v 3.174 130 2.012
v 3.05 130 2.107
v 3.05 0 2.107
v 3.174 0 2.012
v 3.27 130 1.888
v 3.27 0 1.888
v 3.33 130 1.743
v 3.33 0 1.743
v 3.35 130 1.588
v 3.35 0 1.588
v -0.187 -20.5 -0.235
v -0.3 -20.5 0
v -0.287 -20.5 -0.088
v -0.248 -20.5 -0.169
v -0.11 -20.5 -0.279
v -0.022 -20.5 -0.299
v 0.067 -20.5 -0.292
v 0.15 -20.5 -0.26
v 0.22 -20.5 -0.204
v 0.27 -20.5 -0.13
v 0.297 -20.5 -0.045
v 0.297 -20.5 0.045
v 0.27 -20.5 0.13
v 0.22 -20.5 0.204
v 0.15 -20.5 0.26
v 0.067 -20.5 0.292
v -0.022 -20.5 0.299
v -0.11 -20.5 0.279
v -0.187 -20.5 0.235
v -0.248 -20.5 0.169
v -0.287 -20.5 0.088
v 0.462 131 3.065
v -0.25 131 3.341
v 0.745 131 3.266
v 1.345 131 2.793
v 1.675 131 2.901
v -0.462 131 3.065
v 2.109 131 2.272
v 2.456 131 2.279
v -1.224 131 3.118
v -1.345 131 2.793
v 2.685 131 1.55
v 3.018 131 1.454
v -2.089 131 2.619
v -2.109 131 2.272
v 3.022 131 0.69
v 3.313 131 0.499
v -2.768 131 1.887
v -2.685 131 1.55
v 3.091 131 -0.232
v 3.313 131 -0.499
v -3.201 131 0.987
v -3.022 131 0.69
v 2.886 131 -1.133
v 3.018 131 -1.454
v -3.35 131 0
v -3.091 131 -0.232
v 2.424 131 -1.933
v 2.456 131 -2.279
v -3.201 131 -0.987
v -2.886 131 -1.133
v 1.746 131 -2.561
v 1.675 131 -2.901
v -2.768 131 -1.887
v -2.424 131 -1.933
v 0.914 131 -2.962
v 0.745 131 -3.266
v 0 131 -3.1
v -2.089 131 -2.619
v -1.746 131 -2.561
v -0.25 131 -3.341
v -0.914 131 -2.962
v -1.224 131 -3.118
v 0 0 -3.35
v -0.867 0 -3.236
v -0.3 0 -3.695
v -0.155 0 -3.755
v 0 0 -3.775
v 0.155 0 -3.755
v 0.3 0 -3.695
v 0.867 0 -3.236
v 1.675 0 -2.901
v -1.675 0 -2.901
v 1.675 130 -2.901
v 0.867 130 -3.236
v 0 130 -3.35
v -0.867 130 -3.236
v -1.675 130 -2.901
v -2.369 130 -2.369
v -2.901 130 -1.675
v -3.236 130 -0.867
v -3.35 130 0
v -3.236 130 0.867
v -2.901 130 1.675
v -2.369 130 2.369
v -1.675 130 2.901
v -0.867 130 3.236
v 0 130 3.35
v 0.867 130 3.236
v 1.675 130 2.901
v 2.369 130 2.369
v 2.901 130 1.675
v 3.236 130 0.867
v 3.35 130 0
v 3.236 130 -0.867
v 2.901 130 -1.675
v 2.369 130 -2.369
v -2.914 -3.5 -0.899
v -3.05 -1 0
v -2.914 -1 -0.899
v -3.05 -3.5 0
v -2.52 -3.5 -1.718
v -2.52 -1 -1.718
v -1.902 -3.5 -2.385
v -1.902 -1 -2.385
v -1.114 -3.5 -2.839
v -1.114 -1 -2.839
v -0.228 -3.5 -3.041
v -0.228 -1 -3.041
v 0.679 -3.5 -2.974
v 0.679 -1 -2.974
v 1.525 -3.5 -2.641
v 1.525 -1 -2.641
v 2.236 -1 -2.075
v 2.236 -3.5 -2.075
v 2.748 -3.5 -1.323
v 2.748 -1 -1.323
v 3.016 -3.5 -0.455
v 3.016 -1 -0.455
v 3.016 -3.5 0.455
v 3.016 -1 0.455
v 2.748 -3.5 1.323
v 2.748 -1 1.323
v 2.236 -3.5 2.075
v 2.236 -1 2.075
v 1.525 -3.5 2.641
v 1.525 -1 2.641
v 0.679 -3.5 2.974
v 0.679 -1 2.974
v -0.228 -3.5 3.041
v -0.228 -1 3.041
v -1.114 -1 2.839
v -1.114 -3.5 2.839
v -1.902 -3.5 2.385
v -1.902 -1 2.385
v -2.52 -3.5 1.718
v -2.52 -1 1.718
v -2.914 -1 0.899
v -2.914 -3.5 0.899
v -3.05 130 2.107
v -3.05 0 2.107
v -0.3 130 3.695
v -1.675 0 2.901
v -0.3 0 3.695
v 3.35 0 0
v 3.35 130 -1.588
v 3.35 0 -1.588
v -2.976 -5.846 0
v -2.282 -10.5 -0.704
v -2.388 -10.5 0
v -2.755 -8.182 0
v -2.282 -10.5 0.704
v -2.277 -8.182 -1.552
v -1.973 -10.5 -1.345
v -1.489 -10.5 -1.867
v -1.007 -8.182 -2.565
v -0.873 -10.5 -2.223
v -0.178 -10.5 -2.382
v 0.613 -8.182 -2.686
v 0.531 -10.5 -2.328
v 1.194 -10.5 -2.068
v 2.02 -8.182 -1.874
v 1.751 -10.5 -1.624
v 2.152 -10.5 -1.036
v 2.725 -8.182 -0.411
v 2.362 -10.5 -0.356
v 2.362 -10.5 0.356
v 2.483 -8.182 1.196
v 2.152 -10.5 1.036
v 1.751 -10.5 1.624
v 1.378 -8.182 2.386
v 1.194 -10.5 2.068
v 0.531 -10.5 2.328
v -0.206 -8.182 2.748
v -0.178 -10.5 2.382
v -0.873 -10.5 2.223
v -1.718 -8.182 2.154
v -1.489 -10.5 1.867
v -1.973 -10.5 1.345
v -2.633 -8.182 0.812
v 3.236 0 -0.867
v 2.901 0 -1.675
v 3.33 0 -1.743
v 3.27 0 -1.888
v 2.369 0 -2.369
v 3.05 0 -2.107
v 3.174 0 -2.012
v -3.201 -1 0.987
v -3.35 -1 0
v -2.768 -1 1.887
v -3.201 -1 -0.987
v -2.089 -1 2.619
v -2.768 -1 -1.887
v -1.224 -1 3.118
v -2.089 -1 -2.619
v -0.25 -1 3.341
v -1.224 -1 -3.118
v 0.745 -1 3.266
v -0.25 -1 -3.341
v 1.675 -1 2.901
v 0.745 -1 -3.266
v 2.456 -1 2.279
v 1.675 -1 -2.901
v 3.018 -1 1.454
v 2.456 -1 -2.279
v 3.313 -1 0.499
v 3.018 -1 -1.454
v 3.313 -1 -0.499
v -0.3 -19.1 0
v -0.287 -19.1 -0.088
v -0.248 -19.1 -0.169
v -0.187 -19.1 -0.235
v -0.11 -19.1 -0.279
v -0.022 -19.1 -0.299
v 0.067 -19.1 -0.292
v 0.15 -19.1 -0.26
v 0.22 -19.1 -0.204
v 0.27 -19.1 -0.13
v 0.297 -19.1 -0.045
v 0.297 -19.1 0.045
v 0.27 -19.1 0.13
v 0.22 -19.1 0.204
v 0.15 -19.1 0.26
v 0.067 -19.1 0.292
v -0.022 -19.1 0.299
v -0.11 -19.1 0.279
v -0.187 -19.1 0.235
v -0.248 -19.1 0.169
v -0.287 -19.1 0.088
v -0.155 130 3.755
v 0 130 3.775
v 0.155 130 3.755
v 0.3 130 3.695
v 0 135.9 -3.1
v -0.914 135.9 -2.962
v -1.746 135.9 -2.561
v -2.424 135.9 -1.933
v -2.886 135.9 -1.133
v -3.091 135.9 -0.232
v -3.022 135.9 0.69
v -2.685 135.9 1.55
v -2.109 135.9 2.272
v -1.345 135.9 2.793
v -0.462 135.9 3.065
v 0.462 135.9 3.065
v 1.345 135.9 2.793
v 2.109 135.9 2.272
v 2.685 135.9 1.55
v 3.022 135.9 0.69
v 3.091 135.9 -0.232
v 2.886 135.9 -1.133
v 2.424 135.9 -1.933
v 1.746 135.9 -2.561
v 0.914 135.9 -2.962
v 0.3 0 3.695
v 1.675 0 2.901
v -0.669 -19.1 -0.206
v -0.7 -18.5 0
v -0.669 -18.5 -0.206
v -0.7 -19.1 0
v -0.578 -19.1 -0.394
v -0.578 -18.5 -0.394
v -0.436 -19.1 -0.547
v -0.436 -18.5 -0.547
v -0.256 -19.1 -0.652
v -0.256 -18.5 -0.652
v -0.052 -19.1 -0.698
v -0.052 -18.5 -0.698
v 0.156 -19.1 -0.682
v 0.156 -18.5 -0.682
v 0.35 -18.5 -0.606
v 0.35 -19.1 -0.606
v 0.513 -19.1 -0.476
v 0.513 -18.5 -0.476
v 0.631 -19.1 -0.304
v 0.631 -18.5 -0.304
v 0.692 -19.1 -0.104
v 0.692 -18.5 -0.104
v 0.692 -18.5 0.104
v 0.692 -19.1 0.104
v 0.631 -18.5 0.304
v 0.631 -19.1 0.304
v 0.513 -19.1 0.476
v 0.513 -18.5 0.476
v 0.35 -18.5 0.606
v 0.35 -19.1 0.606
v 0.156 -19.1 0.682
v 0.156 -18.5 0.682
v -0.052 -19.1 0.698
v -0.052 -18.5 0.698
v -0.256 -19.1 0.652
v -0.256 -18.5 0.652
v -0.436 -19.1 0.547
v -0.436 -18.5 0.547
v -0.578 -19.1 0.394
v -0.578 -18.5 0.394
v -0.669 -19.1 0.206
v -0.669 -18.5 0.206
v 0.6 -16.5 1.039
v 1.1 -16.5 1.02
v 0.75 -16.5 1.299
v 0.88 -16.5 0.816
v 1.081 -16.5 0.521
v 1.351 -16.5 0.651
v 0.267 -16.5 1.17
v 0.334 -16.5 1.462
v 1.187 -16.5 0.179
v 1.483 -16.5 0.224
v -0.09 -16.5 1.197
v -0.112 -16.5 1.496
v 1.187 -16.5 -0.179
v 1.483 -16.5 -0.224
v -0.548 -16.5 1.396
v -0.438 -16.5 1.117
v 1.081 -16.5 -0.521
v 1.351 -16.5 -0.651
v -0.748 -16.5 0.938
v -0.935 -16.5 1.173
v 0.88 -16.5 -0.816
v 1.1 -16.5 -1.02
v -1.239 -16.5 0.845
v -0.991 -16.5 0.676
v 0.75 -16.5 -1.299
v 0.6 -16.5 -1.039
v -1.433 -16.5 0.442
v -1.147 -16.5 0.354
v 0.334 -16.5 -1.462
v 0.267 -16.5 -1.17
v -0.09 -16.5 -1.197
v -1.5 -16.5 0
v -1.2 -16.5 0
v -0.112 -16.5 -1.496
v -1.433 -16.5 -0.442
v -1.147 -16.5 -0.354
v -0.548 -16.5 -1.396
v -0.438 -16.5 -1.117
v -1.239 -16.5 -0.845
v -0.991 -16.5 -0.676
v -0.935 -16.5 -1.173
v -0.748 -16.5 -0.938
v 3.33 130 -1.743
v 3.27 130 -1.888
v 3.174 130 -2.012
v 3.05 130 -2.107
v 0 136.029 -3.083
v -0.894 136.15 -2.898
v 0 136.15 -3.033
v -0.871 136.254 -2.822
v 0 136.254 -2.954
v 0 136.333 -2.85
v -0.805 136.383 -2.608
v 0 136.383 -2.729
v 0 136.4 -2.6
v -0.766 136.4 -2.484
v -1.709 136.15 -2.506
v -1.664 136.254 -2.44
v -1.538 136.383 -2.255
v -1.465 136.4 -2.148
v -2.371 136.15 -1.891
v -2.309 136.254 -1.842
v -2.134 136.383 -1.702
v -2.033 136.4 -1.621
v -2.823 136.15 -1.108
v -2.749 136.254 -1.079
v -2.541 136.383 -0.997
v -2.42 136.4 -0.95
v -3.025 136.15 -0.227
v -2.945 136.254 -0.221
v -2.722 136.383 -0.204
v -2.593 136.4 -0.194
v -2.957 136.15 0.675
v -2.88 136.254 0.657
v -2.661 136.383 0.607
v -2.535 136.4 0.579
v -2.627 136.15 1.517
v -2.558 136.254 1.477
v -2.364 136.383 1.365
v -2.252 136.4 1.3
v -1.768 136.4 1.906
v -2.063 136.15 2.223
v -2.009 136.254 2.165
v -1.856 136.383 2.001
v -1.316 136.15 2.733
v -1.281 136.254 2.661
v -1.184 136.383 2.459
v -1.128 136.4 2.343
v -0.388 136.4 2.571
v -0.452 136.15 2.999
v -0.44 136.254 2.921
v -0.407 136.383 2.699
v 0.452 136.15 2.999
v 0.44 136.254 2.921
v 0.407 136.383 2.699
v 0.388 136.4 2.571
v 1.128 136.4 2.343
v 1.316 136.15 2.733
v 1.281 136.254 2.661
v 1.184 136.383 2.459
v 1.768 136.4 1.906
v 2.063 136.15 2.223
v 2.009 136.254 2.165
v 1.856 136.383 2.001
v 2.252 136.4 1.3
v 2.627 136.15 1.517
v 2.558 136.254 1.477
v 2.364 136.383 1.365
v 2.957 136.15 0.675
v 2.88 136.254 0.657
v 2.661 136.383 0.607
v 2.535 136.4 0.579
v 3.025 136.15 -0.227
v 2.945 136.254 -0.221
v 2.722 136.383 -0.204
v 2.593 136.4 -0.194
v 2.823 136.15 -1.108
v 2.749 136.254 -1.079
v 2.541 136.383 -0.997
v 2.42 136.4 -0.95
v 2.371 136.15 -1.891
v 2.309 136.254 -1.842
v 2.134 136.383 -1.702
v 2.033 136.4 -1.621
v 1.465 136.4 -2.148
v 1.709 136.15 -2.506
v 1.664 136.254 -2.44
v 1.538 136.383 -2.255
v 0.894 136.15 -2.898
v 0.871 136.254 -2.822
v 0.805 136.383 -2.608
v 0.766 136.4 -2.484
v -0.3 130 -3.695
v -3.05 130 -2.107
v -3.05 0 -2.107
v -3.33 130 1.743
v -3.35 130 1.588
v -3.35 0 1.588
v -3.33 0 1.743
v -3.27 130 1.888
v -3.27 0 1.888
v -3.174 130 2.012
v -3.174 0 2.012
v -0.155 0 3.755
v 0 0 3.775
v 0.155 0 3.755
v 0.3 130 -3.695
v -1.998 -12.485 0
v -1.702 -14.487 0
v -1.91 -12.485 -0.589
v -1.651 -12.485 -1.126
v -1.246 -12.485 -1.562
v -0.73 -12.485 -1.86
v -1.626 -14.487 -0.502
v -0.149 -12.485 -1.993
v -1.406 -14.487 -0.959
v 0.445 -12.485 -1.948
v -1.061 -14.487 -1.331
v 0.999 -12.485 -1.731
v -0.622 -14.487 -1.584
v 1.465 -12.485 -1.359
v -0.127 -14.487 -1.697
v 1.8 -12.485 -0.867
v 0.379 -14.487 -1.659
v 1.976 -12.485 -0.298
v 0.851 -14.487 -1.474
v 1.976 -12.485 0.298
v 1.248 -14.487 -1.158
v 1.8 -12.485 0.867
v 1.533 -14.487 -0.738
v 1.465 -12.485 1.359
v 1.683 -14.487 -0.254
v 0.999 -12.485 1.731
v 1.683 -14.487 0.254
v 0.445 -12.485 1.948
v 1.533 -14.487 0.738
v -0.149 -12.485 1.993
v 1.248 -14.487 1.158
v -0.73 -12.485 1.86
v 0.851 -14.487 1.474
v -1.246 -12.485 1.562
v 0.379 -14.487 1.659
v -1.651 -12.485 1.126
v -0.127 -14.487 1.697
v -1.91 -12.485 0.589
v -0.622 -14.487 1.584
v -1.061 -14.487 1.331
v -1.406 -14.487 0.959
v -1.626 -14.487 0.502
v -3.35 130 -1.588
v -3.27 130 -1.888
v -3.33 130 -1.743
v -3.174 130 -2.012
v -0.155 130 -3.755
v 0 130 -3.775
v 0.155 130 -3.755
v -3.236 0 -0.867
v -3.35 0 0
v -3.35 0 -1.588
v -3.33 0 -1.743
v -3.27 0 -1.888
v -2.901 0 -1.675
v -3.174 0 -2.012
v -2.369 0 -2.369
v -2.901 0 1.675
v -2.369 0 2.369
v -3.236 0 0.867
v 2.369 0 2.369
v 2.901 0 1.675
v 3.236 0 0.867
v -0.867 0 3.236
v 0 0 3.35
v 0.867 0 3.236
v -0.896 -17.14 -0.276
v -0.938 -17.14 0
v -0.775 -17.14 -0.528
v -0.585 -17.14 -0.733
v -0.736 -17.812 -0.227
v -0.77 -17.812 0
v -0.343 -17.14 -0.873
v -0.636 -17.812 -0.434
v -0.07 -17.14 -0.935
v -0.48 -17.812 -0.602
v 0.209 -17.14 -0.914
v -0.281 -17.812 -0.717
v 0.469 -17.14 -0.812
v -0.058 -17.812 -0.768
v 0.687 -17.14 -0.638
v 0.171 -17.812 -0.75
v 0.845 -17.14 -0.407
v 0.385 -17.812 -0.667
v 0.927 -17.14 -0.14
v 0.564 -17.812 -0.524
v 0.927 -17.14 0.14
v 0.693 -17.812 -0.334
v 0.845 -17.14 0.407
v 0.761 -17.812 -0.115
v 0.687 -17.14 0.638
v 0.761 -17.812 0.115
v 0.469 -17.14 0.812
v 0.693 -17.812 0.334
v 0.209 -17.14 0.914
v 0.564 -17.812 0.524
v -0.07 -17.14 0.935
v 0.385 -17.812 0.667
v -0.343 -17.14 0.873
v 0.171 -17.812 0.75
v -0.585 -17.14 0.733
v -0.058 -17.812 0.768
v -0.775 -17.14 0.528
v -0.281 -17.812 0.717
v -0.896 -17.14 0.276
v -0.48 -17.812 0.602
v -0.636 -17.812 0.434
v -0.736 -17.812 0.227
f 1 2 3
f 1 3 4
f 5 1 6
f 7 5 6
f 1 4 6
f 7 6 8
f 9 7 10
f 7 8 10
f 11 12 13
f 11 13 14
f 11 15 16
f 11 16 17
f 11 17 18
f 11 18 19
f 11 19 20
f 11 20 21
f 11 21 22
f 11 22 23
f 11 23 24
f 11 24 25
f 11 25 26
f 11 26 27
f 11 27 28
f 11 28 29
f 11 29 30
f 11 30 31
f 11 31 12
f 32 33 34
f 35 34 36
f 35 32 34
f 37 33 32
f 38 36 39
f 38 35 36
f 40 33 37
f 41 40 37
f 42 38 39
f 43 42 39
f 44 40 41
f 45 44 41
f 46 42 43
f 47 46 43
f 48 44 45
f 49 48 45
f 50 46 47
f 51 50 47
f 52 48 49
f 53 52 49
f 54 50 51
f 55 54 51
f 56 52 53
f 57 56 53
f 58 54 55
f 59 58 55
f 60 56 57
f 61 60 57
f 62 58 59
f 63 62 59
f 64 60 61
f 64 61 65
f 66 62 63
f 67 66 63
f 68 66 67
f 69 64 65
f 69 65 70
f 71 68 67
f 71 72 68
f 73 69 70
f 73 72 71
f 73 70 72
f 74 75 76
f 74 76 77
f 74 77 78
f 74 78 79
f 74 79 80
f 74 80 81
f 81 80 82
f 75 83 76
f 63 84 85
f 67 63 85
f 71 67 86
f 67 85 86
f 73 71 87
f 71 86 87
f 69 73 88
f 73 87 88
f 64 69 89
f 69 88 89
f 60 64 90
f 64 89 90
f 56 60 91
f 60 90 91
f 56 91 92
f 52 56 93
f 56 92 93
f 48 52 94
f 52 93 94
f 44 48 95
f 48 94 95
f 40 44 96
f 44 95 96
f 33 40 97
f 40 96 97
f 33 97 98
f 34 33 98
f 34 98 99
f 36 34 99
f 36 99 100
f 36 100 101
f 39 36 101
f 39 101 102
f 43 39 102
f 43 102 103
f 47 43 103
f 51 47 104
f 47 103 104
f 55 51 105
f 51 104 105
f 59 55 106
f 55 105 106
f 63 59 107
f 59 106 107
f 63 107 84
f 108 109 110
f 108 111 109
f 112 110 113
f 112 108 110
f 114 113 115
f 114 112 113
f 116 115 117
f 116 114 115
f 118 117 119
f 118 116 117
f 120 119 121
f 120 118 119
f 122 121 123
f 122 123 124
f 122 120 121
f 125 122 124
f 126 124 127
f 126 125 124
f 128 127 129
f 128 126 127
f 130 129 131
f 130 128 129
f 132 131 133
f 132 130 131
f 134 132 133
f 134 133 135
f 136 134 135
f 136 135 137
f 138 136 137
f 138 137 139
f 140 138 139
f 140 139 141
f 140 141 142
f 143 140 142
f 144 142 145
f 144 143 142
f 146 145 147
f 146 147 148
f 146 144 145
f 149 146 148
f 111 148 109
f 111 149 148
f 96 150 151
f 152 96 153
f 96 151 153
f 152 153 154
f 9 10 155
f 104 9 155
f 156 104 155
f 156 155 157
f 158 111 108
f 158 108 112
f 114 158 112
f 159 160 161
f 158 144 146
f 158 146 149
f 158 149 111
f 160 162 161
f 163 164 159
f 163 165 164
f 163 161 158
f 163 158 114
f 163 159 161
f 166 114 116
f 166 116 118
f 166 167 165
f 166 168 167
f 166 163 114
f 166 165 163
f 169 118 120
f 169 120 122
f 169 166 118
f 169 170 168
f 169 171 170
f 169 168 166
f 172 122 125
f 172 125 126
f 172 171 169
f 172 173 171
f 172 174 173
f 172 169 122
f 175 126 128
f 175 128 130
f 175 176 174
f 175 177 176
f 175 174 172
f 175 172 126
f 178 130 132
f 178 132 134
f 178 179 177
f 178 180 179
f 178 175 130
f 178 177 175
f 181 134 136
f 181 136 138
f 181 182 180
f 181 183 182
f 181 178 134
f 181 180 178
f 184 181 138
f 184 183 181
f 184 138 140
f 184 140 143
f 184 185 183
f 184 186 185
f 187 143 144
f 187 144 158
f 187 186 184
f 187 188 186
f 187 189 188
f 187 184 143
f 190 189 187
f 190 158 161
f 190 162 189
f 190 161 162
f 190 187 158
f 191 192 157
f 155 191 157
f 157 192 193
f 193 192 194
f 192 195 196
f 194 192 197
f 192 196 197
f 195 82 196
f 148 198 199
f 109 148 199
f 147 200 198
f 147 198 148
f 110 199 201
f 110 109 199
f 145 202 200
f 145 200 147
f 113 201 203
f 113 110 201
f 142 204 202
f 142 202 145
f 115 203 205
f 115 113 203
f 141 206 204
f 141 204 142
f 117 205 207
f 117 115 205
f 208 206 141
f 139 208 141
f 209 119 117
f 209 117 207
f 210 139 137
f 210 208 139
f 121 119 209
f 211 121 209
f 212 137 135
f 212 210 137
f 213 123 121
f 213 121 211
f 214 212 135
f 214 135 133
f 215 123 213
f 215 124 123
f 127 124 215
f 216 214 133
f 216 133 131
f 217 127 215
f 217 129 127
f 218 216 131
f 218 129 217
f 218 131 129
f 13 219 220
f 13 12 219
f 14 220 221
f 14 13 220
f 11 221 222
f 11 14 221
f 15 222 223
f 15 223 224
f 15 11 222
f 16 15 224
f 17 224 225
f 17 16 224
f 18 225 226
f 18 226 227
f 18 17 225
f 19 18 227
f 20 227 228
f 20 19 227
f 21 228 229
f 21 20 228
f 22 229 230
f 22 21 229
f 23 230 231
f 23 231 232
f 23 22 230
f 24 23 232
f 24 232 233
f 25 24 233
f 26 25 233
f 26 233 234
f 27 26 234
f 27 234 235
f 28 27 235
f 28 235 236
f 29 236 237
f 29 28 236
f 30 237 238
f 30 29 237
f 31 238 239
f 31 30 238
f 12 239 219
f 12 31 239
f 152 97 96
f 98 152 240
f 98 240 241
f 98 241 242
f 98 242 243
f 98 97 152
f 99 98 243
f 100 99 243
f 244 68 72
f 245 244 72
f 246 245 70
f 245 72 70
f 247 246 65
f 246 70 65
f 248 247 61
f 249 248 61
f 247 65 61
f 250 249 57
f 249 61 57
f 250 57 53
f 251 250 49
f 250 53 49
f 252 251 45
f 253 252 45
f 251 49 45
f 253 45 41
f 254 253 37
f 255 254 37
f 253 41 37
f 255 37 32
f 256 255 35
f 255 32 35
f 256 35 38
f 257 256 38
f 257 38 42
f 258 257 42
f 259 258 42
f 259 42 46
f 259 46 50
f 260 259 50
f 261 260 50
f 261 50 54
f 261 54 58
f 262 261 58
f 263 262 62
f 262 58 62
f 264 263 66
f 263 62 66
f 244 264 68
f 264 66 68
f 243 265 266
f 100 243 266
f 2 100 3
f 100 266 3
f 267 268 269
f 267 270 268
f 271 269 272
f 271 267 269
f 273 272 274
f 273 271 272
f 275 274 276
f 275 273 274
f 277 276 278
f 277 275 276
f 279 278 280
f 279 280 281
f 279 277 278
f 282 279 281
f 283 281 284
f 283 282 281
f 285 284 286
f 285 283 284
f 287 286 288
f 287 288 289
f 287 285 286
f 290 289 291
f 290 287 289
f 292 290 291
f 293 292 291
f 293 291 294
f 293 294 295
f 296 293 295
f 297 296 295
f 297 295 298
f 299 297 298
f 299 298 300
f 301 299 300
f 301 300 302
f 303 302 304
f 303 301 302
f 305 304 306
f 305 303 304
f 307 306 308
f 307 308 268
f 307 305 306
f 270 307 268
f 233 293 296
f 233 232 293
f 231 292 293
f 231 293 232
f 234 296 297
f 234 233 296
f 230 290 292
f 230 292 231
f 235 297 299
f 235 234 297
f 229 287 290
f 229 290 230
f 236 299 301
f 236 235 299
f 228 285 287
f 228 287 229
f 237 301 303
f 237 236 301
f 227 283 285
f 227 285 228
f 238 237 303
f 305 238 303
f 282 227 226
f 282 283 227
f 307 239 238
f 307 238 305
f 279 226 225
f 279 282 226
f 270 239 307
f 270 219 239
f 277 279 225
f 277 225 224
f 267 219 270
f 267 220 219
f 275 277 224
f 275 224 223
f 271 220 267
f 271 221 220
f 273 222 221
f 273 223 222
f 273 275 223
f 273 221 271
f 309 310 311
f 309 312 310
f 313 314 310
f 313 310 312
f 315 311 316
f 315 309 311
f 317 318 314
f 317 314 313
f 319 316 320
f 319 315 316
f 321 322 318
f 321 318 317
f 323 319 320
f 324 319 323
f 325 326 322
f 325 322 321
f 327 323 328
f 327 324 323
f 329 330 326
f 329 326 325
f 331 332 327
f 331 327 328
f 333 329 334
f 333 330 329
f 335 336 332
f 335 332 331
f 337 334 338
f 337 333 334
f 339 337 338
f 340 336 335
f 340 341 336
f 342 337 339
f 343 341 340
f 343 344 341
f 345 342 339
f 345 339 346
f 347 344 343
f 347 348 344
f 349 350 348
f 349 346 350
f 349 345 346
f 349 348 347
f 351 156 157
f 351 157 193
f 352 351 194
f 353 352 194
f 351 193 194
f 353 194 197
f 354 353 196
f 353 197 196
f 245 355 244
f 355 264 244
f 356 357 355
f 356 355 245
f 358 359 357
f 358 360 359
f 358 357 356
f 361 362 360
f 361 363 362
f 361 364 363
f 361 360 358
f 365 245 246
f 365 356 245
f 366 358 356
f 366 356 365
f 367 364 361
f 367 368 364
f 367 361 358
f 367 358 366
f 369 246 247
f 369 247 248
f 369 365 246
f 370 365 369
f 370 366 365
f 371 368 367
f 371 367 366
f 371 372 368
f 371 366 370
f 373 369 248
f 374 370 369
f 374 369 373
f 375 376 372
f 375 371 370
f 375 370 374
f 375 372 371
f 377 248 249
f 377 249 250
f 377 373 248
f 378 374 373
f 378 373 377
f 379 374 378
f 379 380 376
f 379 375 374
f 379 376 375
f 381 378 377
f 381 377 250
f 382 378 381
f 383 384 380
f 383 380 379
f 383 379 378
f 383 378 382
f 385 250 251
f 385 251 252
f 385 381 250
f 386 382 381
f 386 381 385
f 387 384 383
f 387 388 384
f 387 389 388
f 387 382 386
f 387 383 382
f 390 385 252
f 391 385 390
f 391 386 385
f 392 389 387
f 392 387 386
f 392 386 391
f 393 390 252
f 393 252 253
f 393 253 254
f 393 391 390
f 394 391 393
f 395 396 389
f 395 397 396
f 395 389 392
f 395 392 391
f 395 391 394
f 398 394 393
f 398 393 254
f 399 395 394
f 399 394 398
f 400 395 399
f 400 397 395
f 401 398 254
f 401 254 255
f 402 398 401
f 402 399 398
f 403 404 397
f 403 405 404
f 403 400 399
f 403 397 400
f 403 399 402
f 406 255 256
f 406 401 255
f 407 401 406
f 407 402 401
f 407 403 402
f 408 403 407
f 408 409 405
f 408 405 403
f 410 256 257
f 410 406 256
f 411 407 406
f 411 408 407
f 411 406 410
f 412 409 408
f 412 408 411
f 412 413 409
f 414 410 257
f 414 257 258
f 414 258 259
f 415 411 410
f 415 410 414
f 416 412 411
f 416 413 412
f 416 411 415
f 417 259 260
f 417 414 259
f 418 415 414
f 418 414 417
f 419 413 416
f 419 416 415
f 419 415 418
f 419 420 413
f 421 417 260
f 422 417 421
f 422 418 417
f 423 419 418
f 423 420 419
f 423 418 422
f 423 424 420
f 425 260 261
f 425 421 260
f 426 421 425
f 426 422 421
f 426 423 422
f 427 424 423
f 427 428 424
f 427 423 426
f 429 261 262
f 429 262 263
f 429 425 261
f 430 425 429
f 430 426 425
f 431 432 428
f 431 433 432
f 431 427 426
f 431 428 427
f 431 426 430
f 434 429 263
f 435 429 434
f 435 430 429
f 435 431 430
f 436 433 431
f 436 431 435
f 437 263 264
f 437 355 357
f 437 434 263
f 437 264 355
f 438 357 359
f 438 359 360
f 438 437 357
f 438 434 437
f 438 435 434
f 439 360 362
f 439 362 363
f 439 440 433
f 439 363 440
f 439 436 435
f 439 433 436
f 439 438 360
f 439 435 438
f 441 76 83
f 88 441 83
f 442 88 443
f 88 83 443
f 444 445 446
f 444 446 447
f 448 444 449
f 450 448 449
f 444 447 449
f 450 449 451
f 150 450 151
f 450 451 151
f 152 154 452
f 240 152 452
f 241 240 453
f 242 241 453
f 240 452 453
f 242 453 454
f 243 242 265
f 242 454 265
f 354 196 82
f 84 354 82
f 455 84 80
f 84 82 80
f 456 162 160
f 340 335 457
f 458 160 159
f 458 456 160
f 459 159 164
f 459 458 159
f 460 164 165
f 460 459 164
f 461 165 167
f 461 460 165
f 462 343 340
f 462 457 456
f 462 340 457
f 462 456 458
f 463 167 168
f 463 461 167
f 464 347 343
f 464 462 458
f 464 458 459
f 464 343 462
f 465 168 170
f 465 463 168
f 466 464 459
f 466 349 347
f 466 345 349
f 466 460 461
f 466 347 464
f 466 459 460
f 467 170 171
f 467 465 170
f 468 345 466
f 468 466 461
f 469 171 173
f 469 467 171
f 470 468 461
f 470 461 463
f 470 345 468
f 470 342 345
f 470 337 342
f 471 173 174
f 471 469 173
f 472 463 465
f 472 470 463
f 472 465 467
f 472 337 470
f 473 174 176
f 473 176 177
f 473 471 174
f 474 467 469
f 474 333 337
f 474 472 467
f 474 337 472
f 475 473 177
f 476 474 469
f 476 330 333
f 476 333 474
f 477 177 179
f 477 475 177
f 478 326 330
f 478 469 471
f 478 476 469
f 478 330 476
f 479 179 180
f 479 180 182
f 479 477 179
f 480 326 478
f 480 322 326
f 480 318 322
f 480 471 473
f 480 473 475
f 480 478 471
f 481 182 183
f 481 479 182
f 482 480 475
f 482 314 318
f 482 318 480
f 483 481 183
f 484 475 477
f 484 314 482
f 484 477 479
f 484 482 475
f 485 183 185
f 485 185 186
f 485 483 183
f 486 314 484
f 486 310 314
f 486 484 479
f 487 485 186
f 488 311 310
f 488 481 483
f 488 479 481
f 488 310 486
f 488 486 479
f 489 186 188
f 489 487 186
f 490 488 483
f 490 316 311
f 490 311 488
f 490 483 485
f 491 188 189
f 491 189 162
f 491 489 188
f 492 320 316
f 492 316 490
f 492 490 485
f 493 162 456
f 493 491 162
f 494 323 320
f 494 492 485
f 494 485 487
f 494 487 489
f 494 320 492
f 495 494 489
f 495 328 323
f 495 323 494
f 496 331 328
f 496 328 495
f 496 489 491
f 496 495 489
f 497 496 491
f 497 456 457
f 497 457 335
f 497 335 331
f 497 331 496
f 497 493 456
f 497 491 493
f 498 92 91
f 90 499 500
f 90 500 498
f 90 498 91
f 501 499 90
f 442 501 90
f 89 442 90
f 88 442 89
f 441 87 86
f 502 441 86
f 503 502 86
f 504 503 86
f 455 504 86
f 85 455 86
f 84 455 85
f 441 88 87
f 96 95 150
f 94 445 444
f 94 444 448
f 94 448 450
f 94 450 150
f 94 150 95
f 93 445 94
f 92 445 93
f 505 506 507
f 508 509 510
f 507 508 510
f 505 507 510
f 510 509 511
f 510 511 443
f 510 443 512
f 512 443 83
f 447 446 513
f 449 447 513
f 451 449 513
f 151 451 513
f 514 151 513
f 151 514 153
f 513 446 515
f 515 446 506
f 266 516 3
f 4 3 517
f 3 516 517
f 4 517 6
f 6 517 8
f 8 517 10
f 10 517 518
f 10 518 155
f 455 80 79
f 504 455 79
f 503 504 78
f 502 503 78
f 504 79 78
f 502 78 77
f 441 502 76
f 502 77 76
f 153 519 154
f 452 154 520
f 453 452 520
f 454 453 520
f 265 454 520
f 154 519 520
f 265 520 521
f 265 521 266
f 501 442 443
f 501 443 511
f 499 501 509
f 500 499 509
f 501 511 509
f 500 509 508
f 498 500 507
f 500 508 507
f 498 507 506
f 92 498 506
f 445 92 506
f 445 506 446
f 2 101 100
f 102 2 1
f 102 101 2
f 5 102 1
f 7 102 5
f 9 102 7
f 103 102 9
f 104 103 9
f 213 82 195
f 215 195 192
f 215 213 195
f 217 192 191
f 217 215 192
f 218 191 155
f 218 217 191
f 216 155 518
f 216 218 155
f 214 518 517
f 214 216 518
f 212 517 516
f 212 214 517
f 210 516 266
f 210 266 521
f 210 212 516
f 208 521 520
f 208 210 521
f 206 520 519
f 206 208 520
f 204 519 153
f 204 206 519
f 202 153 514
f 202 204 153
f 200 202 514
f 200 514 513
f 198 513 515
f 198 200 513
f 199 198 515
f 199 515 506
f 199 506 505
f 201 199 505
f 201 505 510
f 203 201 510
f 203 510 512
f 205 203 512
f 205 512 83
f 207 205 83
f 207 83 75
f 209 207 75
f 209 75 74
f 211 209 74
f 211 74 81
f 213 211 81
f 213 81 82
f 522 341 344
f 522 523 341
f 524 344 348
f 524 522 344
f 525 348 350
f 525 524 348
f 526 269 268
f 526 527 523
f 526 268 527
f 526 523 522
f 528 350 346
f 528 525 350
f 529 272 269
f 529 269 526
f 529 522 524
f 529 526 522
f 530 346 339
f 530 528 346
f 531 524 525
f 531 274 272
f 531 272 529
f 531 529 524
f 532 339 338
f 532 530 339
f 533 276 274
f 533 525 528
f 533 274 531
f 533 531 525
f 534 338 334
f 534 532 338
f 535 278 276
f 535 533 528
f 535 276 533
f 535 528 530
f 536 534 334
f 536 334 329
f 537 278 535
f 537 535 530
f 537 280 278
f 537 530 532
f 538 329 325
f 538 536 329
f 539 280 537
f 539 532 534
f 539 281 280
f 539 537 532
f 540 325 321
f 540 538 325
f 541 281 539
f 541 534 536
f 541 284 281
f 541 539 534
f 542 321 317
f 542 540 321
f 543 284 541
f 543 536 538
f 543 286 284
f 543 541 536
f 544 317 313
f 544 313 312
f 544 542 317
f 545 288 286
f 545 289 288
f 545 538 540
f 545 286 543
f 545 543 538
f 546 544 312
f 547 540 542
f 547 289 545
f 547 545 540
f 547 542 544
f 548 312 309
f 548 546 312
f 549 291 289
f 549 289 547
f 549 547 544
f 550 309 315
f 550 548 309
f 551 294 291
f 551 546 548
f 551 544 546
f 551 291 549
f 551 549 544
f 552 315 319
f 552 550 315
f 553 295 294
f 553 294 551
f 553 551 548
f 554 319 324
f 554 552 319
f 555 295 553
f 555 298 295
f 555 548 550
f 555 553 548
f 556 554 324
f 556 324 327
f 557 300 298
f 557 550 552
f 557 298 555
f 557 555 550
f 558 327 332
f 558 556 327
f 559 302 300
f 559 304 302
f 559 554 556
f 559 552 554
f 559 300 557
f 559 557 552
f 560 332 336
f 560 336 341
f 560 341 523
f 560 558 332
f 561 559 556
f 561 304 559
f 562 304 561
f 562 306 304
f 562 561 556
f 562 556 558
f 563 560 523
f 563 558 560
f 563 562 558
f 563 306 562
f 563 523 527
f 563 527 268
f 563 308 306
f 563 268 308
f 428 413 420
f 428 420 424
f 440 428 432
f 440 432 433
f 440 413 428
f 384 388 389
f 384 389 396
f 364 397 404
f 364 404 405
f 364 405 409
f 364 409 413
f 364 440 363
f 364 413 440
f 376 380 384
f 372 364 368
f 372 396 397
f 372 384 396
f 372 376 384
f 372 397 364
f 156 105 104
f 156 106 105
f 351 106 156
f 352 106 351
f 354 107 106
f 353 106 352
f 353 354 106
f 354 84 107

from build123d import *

# Parameters (mm, degrees)
RESSALTO_EXTRUS_O1_DEPTH = 130
ESBO_O2_R                = 3.35
RESSALTO_EXTRUS_O2_DEPTH = 1
ESBO_O3_R                = 3.1
RESSALTO_EXTRUS_O3_DEPTH = 5.4
FILETE1_R                = 0.5
RESSALTO_EXTRUS_O4_START = 1
ESBO_O4_R                = 3.35
RESSALTO_EXTRUS_O4_DEPTH = 1


with BuildPart() as part:
    # Esboço1 → Ressalto-extrusão1 (new body)
    with BuildSketch(Plane(origin=(0, 0, 0), x_dir=(1, 0, 0), z_dir=(0, 1, 0))):
        with BuildLine():
            Line((0.3, -3.695041723), (3.05, -2.107328483))
            ThreePointArc((3.05, -2.107328483), (3.269615242, -1.88771324), (3.35, -1.58771324))
            Line((3.35, -1.58771324), (3.35, 1.58771324))
            ThreePointArc((3.35, 1.58771324), (3.269615242, 1.88771324), (3.05, 2.107328483))
            Line((3.05, 2.107328483), (0.3, 3.695041723))
            ThreePointArc((0.3, 3.695041723), (0, 3.775426481), (-0.3, 3.695041723))
            Line((-0.3, 3.695041723), (-3.05, 2.107328483))
            ThreePointArc((-3.05, 2.107328483), (-3.269615242, 1.88771324), (-3.35, 1.58771324))
            Line((-3.35, 1.58771324), (-3.35, -1.58771324))
            ThreePointArc((-3.35, -1.58771324), (-3.269615242, -1.88771324), (-3.05, -2.107328483))
            Line((-3.05, -2.107328483), (-0.3, -3.695041723))
            ThreePointArc((-0.3, -3.695041723), (0, -3.775426481), (0.3, -3.695041723))
        make_face()
    extrude(amount=RESSALTO_EXTRUS_O1_DEPTH)

    # Esboço2 → Ressalto-extrusão2 (add)
    with BuildSketch(Plane(origin=(0, 130, 0), x_dir=(1, 0, 0), z_dir=(0, 1, 0))):
        with Locations(Location((0, 0, 0), (0, 0, 60))):
            Circle(ESBO_O2_R)
    extrude(amount=RESSALTO_EXTRUS_O2_DEPTH)

    # Esboço3 → Ressalto-extrusão3 (add)
    with BuildSketch(Plane(origin=(0, 131, 0), x_dir=(1, 0, 0), z_dir=(0, 1, 0))):
        with Locations(Location((0, 0, 0), (0, 0, 90))):
            Circle(ESBO_O3_R)
    extrude(amount=RESSALTO_EXTRUS_O3_DEPTH)

    # Filete1
    filete1_edges = [part.edges().sort_by_distance(p)[0] for p in [
        (0, 136.4, 3.1),
    ]]
    fillet(filete1_edges, radius=FILETE1_R)

    # Esboço4 → Ressalto-extrusão4 (add)
    with BuildSketch(Plane.XZ.offset(RESSALTO_EXTRUS_O4_START)):
        with Locations(Location((0, 0, 0), (0, 0, 300))):
            Circle(ESBO_O4_R)
    extrude(amount=-RESSALTO_EXTRUS_O4_DEPTH)

    # Esboço5 → Revolução1 (revolve)
    with BuildSketch(Plane.XY, mode=Mode.PRIVATE) as revolu_o1_sk:
        with BuildLine():
            Line((3.05, -1), (3.05, -3.5))
            ThreePointArc((3.05, -3.5), (2.884182518, -7.015607207), (2.388202336, -10.5))
            ThreePointArc((2.388202336, -10.5), (1.838385418, -13.484350504), (1.5, -16.5))
            Line((1.5, -16.5), (1.2, -16.5))
            ThreePointArc((1.2, -16.5), (0.8415304, -17.4728826), (0.7, -18.5))
            Line((0.7, -18.5), (0.7, -19.1))
            Line((0.7, -19.1), (0.3, -19.1))
            Line((0.3, -19.1), (0.3, -20.5))
            Line((0.3, -20.5), (0, -20.5))
            Line((0, -20.5), (0, -1))
            Line((0, -1), (3.05, -1))
        make_face()
    revolve(revolu_o1_sk.sketch.rotate(Axis((0, -1, 0), (0, -1, 0)), 180), axis=Axis((0, -1, 0), (0, -1, 0)))


solid = part.part
